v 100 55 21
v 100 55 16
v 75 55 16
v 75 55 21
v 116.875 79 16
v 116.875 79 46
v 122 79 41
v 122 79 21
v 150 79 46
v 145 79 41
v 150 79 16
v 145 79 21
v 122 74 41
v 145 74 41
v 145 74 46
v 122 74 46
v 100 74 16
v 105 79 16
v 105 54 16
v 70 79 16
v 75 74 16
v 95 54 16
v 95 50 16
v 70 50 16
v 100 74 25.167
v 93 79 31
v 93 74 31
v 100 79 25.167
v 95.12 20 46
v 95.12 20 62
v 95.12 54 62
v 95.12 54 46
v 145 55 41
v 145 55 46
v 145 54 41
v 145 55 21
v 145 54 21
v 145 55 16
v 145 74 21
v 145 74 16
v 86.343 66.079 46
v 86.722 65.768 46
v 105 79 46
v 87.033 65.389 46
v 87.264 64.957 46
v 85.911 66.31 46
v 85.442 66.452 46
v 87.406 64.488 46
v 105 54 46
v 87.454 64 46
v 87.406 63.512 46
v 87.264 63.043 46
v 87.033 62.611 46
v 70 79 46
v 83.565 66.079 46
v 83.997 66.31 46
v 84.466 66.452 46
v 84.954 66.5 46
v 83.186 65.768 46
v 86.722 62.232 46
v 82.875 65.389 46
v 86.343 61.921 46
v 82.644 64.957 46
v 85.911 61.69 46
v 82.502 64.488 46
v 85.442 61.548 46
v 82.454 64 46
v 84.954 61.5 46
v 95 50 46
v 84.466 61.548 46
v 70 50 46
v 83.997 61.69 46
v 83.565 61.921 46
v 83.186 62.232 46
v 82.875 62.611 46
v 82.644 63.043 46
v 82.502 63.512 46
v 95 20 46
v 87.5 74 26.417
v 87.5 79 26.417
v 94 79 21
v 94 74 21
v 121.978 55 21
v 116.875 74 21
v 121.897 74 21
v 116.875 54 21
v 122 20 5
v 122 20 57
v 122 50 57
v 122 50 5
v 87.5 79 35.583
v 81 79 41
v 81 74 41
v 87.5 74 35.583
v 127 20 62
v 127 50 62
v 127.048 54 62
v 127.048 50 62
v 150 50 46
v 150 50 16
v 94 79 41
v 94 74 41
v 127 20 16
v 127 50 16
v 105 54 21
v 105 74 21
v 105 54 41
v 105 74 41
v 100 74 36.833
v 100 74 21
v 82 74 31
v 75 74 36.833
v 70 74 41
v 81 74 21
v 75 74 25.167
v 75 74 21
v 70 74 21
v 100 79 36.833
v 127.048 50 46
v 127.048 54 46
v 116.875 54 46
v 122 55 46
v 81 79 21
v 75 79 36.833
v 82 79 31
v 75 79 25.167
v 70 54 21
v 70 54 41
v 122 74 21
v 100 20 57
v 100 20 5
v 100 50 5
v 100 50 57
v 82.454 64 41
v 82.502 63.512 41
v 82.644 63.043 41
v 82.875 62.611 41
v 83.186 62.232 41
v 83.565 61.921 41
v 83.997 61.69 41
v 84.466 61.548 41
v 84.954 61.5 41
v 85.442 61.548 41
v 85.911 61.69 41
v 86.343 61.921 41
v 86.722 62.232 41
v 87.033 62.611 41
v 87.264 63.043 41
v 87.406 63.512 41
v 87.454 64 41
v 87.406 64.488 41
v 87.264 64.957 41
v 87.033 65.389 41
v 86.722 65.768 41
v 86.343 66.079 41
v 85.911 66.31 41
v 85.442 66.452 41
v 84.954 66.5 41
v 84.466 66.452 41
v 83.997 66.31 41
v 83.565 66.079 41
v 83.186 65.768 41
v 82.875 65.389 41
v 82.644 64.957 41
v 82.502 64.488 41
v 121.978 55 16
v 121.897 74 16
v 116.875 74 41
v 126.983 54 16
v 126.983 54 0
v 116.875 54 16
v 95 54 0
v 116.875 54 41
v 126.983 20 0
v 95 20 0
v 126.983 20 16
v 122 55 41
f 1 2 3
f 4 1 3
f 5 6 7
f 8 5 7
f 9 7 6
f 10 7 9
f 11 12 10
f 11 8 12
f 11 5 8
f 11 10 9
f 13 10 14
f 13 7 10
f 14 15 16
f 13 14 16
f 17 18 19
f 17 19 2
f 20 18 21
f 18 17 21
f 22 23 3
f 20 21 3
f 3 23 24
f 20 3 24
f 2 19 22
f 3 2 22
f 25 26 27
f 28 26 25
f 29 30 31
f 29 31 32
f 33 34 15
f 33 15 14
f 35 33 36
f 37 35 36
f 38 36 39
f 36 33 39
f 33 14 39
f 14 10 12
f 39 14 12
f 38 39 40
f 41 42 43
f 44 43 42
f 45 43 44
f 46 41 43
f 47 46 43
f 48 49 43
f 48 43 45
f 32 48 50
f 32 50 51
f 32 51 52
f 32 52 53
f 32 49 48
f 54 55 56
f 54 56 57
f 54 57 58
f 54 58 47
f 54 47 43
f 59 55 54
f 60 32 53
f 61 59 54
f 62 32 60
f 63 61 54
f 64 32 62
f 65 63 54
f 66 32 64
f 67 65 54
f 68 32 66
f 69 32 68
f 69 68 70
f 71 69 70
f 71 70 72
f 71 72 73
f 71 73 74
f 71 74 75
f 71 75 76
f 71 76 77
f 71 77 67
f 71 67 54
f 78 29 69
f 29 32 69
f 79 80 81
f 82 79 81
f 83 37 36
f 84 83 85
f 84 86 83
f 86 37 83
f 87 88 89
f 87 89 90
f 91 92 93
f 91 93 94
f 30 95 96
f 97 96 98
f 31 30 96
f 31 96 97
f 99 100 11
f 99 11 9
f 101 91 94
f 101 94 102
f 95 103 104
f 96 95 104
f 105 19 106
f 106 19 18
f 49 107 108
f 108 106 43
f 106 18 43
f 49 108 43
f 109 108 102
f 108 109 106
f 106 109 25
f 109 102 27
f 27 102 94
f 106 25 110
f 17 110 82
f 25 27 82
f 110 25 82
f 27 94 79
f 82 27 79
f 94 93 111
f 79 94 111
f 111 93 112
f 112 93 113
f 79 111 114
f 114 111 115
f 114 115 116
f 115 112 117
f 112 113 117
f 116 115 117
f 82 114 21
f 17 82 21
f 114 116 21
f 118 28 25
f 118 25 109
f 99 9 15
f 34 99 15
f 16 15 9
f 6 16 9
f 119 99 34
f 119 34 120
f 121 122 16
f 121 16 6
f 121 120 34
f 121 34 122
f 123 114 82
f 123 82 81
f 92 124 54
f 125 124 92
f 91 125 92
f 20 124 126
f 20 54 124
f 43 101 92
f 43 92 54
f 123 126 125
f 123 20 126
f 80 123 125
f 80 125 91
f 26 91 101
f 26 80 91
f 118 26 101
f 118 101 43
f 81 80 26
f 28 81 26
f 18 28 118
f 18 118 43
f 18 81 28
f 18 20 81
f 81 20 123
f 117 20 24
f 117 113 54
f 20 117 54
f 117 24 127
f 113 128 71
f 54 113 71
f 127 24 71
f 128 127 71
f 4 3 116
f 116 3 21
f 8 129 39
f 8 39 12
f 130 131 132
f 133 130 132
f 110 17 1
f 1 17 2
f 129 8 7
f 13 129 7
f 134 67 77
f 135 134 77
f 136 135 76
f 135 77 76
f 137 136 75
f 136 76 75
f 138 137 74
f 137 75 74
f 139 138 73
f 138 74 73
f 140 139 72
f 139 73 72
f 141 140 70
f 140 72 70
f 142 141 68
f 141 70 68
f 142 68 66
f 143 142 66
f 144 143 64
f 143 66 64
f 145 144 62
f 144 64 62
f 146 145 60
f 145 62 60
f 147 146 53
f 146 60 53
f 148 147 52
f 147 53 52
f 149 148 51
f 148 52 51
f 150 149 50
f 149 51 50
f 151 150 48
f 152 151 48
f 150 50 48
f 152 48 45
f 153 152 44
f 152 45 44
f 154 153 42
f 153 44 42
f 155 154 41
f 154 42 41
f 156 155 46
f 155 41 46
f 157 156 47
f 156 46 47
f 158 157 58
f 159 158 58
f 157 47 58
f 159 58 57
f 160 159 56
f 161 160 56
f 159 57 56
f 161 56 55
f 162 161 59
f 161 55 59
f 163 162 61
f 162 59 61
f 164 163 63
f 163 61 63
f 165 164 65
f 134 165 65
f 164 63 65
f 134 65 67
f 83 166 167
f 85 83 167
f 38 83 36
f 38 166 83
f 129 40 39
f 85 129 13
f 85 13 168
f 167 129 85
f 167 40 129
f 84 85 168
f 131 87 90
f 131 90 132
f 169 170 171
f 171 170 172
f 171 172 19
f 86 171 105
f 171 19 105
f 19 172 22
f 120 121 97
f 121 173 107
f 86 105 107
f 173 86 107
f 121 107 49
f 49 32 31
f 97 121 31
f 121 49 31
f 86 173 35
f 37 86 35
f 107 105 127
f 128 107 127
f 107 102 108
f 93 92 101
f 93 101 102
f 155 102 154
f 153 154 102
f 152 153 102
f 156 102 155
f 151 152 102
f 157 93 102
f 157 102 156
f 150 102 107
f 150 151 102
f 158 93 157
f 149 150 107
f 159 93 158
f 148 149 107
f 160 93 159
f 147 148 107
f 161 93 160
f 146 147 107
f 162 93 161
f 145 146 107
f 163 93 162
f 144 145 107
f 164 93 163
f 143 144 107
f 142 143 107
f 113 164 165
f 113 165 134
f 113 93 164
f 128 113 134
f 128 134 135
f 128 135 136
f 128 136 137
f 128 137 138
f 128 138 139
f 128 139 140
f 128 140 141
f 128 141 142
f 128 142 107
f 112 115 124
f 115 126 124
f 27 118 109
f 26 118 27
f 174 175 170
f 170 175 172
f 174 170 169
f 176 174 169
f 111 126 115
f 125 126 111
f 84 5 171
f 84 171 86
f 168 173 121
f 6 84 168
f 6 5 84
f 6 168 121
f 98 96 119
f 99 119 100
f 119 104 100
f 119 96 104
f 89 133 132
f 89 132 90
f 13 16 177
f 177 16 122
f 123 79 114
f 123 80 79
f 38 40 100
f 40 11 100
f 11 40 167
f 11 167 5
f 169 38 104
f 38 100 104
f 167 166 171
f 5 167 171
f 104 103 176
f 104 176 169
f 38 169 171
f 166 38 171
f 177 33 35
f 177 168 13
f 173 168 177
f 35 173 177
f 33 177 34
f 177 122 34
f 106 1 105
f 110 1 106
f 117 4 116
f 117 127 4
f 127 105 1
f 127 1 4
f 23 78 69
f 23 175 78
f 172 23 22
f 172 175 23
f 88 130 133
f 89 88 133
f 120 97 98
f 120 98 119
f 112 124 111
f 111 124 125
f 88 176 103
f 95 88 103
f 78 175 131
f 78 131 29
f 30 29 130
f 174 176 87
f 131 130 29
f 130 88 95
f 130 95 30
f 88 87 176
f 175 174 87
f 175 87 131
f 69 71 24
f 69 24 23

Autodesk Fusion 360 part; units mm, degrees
sketch "Sketch1" plane through (0, 0, 0) normal (0, 0, 1) x (1, 0, 0)
  line L0 (100, 50) -> (100, 20)
  line L1 (100, 50) -> (150, 50)
  line L2 (120, 20) -> (100, 20)
  line L3 (70, 50) -> (70, 70)
  line L4 (70, 70) -> (150, 70)
  line L5 (100, 50) -> (120, 50)
  line L6 (120, 50) -> (120, 20)
  line L7 (150, 50) -> (150, 70)
  line L8 (150, 50) -> (100, 50)
  line L9 (70, 50) -> (150, 50)
  line L10 (120, 50) -> (150, 50)
  line L11 (100, 50) -> (70, 50)
  line L12 (120, 50) -> (125, 50)
  line L13 (125, 20) -> (125, 50)
  line L14 (125, 20) -> (120, 20)
  line L15 (100, 20) -> (95, 20)
  line L16 (95, 20) -> (95, 50)
  dimension "d1" = 30
  dimension "d2" = 50
  dimension "d3" = 20
extrude "Extrude1" add sketch "Sketch1" along normal blind 60
sketch "Sketch2" plane through (0, 20, 0) normal (0, -1, 0) x (1, 0, 0)
  line L0 (95, 0) -> (125, 0)
  line L1 (125, 0) -> (125, 60)
  line L2 (125, 60) -> (95, 60)
  line L3 (95, 60) -> (95, 0)
  line L4 (95, 0) -> (100, 0)
  line L5 (100, 0) -> (100, 55)
  line L6 (100, 55) -> (120, 55)
  line L7 (120, 55) -> (120, 5)
  line L8 (120, 5) -> (100, 5)
  line L9 (-15, -85) -> (-10, -80)
  dimension "d6" = 5
extrude "Extrude2" add 1 faces at (105, 63.3333, 60) along direction (0, 0, 1) blind 2
extrude "Extrude3" cut sketch "Sketch2" against normal blind 30 contours L5 L6 L7 L8
extrude "Extrude4" cut 1 faces at (106.6667, 30, 55) along direction (0, 0, 1) blind 2
extrude "Extrude5" add 1 faces at (125, 40, 41.3333) along direction (1, 0, 0) blind 2
extrude "Extrude6" cut 1 faces at (120, 30, 39.6667) along direction (1, 0, 0) blind 2
sketch "Sketch3" plane through (0, 70, 0) normal (0, 1, 0) x (-1, 0, 0)
  line L0 (-150, 0) -> (-70, 0)
  line L1 (-70, 0) -> (-70, 62)
  line L2 (-70, 62) -> (-150, 62)
  line L3 (-150, 62) -> (-150, 0)
  line L4 (-70, 31) -> (-150, 31)
  line L5 (-150, 31) -> (-150, 16)
  line L6 (-150, 31) -> (-150, 46)
  line L7 (-150, 16) -> (-70, 16)
  line L8 (-150, 46) -> (-70, 46)
  dimension "d17" = 15
  dimension "d18" = 15
extrude "Extrude7" cut sketch "Sketch3" against normal blind 16 contours L0 L1 L3 L7 | L1 L2 L3 L8
sketch "Sketch4" plane through (0, 0, 0) normal (0, 0, -1) x (1, 0, 0)
  line L0 (70, -54) -> (150, -54)
  line L1 (150, -54) -> (150, -50)
  line L2 (150, -50) -> (127, -50)
  line L3 (127, -50) -> (127, -20)
  line L4 (127, -20) -> (95, -20)
  line L5 (95, -20) -> (95, -50)
  line L6 (95, -50) -> (70, -50)
  line L7 (70, -50) -> (70, -54)
  line L8 (127, -50) -> (127, -54)
  line L9 (95, -50) -> (95, -54)
sketch "Sketch5" plane through (0, 54, 0) normal (0, 1, 0) x (-1, 0, 0)
  line L0 (-150, 0) -> (-70, 0)
  line L1 (-70, 0) -> (-70, 16)
  line L2 (-70, 16) -> (-150, 16)
  line L3 (-150, 16) -> (-150, 0)
  line L4 (-95, 0) -> (-95, 16)
  line L5 (-126.9826, 0) -> (-126.9826, 16)
extrude "Extrude8" cut sketch "Sketch5" against normal blind 50 contours L0 L2 L3 L5 | L0 L1 L2 L4
sketch "Sketch6" plane through (0, 0, 62) normal (0, 0, 1) x (-1, 0, 0)
  line L0 (-150, -54) -> (-70, -54)
  line L1 (-70, -54) -> (-70, -50)
  line L2 (-70, -50) -> (-95, -50)
  line L3 (-95, -50) -> (-95, -20)
  line L4 (-95, -20) -> (-127, -20)
  line L5 (-127, -20) -> (-127, -50)
  line L6 (-127, -50) -> (-150, -50)
  line L7 (-150, -50) -> (-150, -54)
  line L8 (-127, -50) -> (-127, -54)
  line L9 (-127, -54) -> (-95, -50)
  line L10 (-95, -54) -> (-95, -50)
sketch "Sketch7" plane through (0, 54, 0) normal (0, 1, 0) x (-1, 0, 0)
  line L0 (-150, 46) -> (-70, 46)
  line L1 (-70, 46) -> (-70, 62)
  line L2 (-70, 62) -> (-150, 62)
  line L3 (-150, 62) -> (-150, 46)
  line L4 (-95.1201, 62) -> (-95.1201, 46)
  line L5 (-127.0485, 62) -> (-127.0485, 46)
extrude "Extrude9" cut sketch "Sketch7" against normal blind 50 contours L0 L2 L3 L5 | L0 L1 L2 L4
sketch "Sketch8" plane through (0, 0, 0) normal (0, 0, -1) x (1, 0, 0)
extrude "Extrude10" add 1 faces at (96.6667, 70, 36) along direction (0, 1, 0) blind 9
sketch "Sketch9" plane through (0, 0, 62) normal (0, 0, 1) x (1, 0, 0)
sketch "Sketch10" plane through (70, 0, 0) normal (-1, 0, 0) x (0, -1, 0)
  line L0 (-50, 46) -> (-79, 46)
  line L1 (-79, 46) -> (-79, 16)
  line L2 (-79, 16) -> (-50, 16)
  line L3 (-50, 16) -> (-50, 46)
  line L4 (-74, 27.7711) -> (-74, 16)
  line L5 (-74, 27.7711) -> (-74, 46)
  line L6 (-74, 46) -> (-54, 46)
  line L7 (-54, 16) -> (-54, 46)
  line L8 (-54, 16) -> (-54, 21)
  line L9 (-54, 21) -> (-74, 21)
  line L10 (-74, 21) -> (-74, 41)
  line L11 (-74, 41) -> (-54, 41)
  dimension "d28" = 20
  dimension "d29" = 5
  dimension "d30" = 20
extrude "Extrude11" cut sketch "Sketch10" against normal blind 500 contours L4 L5 L7 L9 L10 L11
sketch "Sketch11" plane through (0, 0, 0) normal (0, 1, 0) x (1, 0, 0)
sketch "Sketch12" plane through (0, 79, 0) normal (0, 1, 0) x (-1, 0, 0)
  line L0 (-150, 16) -> (-70, 16)
  line L1 (-70, 16) -> (-70, 46)
  line L2 (-70, 46) -> (-150, 46)
  line L3 (-150, 46) -> (-150, 16)
  line L4 (-94.9405, 16) -> (-94.9405, 46)
  line L5 (-126.875, 16) -> (-126.875, 46)
  line L6 (-94.9405, 16) -> (-99.9405, 16)
  line L7 (-126.875, 16) -> (-121.875, 16)
  line L8 (-99.9405, 16) -> (-105, 16)
  line L9 (-121.875, 16) -> (-116.875, 16)
  line L10 (-105, 16) -> (-105, 46)
  line L11 (-116.875, 16) -> (-116.875, 46)
  dimension "d33" = 5
  dimension "d34" = 5
  dimension "d35" = 5
extrude "Extrude12" cut sketch "Sketch12" against normal blind 25 contours L0 L2 L10 L11
sketch "Sketch13" plane through (0, 79, 0) normal (0, 1, 0) x (-1, 0, 0)
  line L0 (-105, 46) -> (-105, 16)
  line L1 (-105, 16) -> (-70, 16)
  line L2 (-70, 16) -> (-70, 46)
  line L3 (-70, 46) -> (-105, 46)
  line L4 (-70, 16) -> (-75, 16)
  line L5 (-70, 16) -> (-70, 21)
  line L6 (-105, 46) -> (-105, 41)
  line L7 (-105, 46) -> (-100, 46)
  line L8 (-105, 16) -> (-105, 17)
  line L9 (-105, 16) -> (-105, 21)
  line L10 (-105, 16) -> (-100, 16)
  line L11 (-70, 46) -> (-75, 46)
  line L12 (-70, 46) -> (-70, 41)
  line L13 (-94, 41) -> (-81, 41)
  line L14 (-75, 25.1667) -> (-75, 36.8333)
  line L15 (-100, 25.1667) -> (-100, 36.8333)
  line L16 (-81, 21) -> (-94, 21)
  line L17 (-75, 36.8333) -> (-82, 31)
  line L18 (-87.5, 26.4167) -> (-94, 21)
  line L19 (-81, 41) -> (-87.5, 35.5833)
  line L20 (-93, 31) -> (-100, 25.1667)
  line L21 (-100, 36.8333) -> (-93, 31)
  line L22 (-87.5, 26.4167) -> (-81, 21)
  line L23 (-75, 25.1667) -> (-82, 31)
  line L24 (-87.5, 35.5833) -> (-94, 41)
  dimension "d38" = 5
  dimension "d39" = 5
  dimension "d40" = 5
  dimension "d41" = 5
  dimension "d42" = 5
  dimension "d43" = 5
  dimension "d44" = 5
extrude "Extrude13" cut sketch "Sketch13" against normal blind 5 contours L13 L19 L24 | L14 L17 L23 | L15 L20 L21 | L16 L18 L22
sketch "Sketch14" plane through (0, 79, 0) normal (0, 1, 0) x (-1, 0, 0)
  line L0 (-116.875, 16) -> (-116.875, 46)
  line L1 (-116.875, 46) -> (-150, 46)
  line L2 (-150, 46) -> (-150, 16)
  line L3 (-150, 16) -> (-116.875, 16)
sketch "Sketch15" plane through (0, 0, 46) normal (0, 0, 1) x (-1, 0, 0)
  line L0 (-105, -54) -> (-105, -79)
  line L1 (-105, -79) -> (-70, -79)
  line L2 (-70, -79) -> (-70, -50)
  line L3 (-70, -50) -> (-95, -50)
  line L4 (-95, -50) -> (-95, -20)
  line L5 (-95, -20) -> (-95.1201, -20)
  line L6 (-95.1201, -20) -> (-95.1201, -54)
  line L7 (-95.1201, -54) -> (-105, -54)
  line L8 (-84.9539, -79) -> (-84.9539, -74)
  line L9 (-84.9539, -74) -> (-84.9539, -64)
  circle A0 centre (-84.9539, -64) radius 2.5
  dimension "d47" = 5
  dimension "d48" = 10
  dimension "d49" = 5
extrude "Extrude14" cut sketch "Sketch15" against normal blind 10 contours A0
sketch "Sketch16" plane through (0, 79, 0) normal (0, 1, 0) x (-1, 0, 0)
  line L0 (-81, 21) -> (-94, 21)
  line L1 (-94, 21) -> (-87.5, 26.4167)
  line L2 (-87.5, 26.4167) -> (-81, 21)
  line L3 (-75, 25.1667) -> (-82, 31)
  line L4 (-82, 31) -> (-75, 36.8333)
  line L5 (-75, 36.8333) -> (-75, 25.1667)
  line L6 (-93, 31) -> (-100, 25.1667)
  line L7 (-100, 25.1667) -> (-100, 36.8333)
  line L8 (-100, 36.8333) -> (-93, 31)
  line L9 (-94, 41) -> (-81, 41)
  line L10 (-81, 41) -> (-87.5, 35.5833)
  line L11 (-87.5, 35.5833) -> (-94, 41)
  line L12 (-105, 46) -> (-105, 16)
  line L13 (-105, 16) -> (-70, 16)
  line L14 (-70, 16) -> (-70, 46)
  line L15 (-70, 46) -> (-105, 46)
  line L16 (-117, 16) -> (-122, 16)
  line L17 (-117, 16) -> (-117, 21)
  line L18 (-117, 46) -> (-122, 46)
  line L19 (-117, 46) -> (-117, 41)
  line L20 (-150, 46) -> (-145, 46)
  line L21 (-150, 46) -> (-150, 41)
  line L22 (-150, 16) -> (-145, 16)
  line L23 (-150, 16) -> (-150, 21)
  line L24 (-150, 21) -> (-117, 21)
  line L25 (-122, 16) -> (-122, 46)
  line L26 (-117, 41) -> (-150, 41)
  line L27 (-145, 46) -> (-145, 16)
  dimension "d52" = 5
  dimension "d53" = 5
  dimension "d54" = 5
  dimension "d55" = 5
  dimension "d56" = 5
  dimension "d57" = 5
  dimension "d58" = 5
  dimension "d59" = 5
extrude "Extrude15" cut sketch "Sketch16" against normal blind 6 contours L24 L25 L26 L27
sketch "Sketch17" plane through (0, 0, 46) normal (0, 0, 1) x (-1, 0, 0)
  circle A0 centre (-84.9539, -64) radius 2.5
  line L0 (-105, -54) -> (-105, -79)
  line L1 (-105, -79) -> (-70, -79)
  line L2 (-70, -79) -> (-70, -50)
  line L3 (-70, -50) -> (-95, -50)
  line L4 (-95, -50) -> (-95, -20)
  line L5 (-95, -20) -> (-95.1201, -20)
  line L6 (-95.1201, -20) -> (-95.1201, -54)
  line L7 (-95.1201, -54) -> (-105, -54)
  line L8 (-117, -79) -> (-122, -79)
  line L9 (-117, -79) -> (-117, -74)
  line L10 (-150, -79) -> (-150, -74)
  line L11 (-150, -79) -> (-145, -79)
  line L12 (-150, -50) -> (-150, -55)
  line L13 (-150, -50) -> (-145, -50)
  line L14 (-145, -50) -> (-117, -50)
  line L15 (-117, -50) -> (-117, -55)
  line L16 (-117, -55) -> (-117, -50)
  line L17 (-117, -50) -> (-122, -50)
  line L18 (-122, -79) -> (-122, -50)
  line L19 (-117, -55) -> (-150, -55)
  line L20 (-145, -50) -> (-145, -79)
  line L21 (-150, -74) -> (-117, -74)
  dimension "d62" = 5
  dimension "d63" = 5
  dimension "d64" = 5
  dimension "d65" = 5
  dimension "d66" = 5
extrude "Extrude16" cut sketch "Sketch17" against normal blind 6 contours L18 L19 L20 L21
sketch "Sketch18" plane through (0, 0, 16) normal (0, 0, -1) x (1, 0, 0)
  line L0 (116.875, -54) -> (116.875, -79)
  line L1 (116.875, -79) -> (150, -79)
  line L2 (150, -79) -> (150, -50)
  line L3 (150, -50) -> (127, -50)
  line L4 (127, -50) -> (127, -20)
  line L5 (127, -20) -> (126.9826, -20)
  line L6 (126.9826, -20) -> (126.9826, -54)
  line L7 (126.9826, -54) -> (116.875, -54)
  line L8 (150, -79) -> (145, -79)
  line L9 (150, -79) -> (150, -75)
  line L10 (150, -50) -> (145, -50)
  line L11 (150, -50) -> (150, -55)
  line L12 (116.875, -79) -> (116.875, -74)
  line L13 (116.875, -79) -> (121.875, -79)
  line L14 (127, -50) -> (117, -50)
  line L15 (117, -50) -> (117, -58)
  line L16 (117, -58) -> (117, -50)
  line L17 (117, -50) -> (117, -55)
  line L18 (117, -50) -> (122, -50)
  line L19 (122, -50) -> (121.875, -79)
  line L20 (117, -55) -> (150, -55)
  line L21 (145, -50) -> (145, -79)
  line L22 (150, -75) -> (150, -74)
  line L23 (150, -74) -> (116.875, -74)
  dimension "d69" = 5
  dimension "d70" = 5
  dimension "d71" = 5
  dimension "d72" = 5
  dimension "d73" = 5
  dimension "d74" = 5
  dimension "d75" = 5
  dimension "d76" = 1
extrude "Extrude17" cut sketch "Sketch18" against normal blind 6 contours L19 L20 L21 L23
sketch "Sketch19" plane through (0, 0, 16) normal (0, 0, -1) x (1, 0, 0)
  line L0 (105, -79) -> (105, -54)
  line L1 (105, -54) -> (95, -54)
  line L2 (95, -54) -> (95, -50)
  line L3 (95, -50) -> (70, -50)
  line L4 (70, -50) -> (70, -79)
  line L5 (70, -79) -> (105, -79)
  line L6 (105, -79) -> (100, -79)
  line L7 (105, -79) -> (105, -74)
  line L8 (70, -79) -> (70, -74)
  line L9 (70, -79) -> (75, -79)
  line L10 (70, -50) -> (70, -55)
  line L11 (70, -50) -> (75, -50)
  line L12 (105, -54) -> (105, -50)
  line L13 (105, -50) -> (105, -55)
  line L14 (105, -50) -> (100, -50)
  line L15 (100, -50) -> (105, -50)
  line L16 (100, -79) -> (100, -50)
  line L17 (105, -55) -> (70, -55)
  line L18 (75, -50) -> (75, -79)
  line L19 (70, -74) -> (105, -74)
  dimension "d79" = 5
  dimension "d80" = 5
  dimension "d81" = 5
  dimension "d82" = 5
  dimension "d83" = 5
  dimension "d84" = 5
  dimension "d85" = 5
  dimension "d86" = 5
extrude "Extrude18" cut sketch "Sketch19" against normal blind 6 contours L16 L17 L18 L19
extrude "Extrude19" add 1 faces at (146.6667, 74, 34.3333) along direction (0, -1, 0) blind 20
